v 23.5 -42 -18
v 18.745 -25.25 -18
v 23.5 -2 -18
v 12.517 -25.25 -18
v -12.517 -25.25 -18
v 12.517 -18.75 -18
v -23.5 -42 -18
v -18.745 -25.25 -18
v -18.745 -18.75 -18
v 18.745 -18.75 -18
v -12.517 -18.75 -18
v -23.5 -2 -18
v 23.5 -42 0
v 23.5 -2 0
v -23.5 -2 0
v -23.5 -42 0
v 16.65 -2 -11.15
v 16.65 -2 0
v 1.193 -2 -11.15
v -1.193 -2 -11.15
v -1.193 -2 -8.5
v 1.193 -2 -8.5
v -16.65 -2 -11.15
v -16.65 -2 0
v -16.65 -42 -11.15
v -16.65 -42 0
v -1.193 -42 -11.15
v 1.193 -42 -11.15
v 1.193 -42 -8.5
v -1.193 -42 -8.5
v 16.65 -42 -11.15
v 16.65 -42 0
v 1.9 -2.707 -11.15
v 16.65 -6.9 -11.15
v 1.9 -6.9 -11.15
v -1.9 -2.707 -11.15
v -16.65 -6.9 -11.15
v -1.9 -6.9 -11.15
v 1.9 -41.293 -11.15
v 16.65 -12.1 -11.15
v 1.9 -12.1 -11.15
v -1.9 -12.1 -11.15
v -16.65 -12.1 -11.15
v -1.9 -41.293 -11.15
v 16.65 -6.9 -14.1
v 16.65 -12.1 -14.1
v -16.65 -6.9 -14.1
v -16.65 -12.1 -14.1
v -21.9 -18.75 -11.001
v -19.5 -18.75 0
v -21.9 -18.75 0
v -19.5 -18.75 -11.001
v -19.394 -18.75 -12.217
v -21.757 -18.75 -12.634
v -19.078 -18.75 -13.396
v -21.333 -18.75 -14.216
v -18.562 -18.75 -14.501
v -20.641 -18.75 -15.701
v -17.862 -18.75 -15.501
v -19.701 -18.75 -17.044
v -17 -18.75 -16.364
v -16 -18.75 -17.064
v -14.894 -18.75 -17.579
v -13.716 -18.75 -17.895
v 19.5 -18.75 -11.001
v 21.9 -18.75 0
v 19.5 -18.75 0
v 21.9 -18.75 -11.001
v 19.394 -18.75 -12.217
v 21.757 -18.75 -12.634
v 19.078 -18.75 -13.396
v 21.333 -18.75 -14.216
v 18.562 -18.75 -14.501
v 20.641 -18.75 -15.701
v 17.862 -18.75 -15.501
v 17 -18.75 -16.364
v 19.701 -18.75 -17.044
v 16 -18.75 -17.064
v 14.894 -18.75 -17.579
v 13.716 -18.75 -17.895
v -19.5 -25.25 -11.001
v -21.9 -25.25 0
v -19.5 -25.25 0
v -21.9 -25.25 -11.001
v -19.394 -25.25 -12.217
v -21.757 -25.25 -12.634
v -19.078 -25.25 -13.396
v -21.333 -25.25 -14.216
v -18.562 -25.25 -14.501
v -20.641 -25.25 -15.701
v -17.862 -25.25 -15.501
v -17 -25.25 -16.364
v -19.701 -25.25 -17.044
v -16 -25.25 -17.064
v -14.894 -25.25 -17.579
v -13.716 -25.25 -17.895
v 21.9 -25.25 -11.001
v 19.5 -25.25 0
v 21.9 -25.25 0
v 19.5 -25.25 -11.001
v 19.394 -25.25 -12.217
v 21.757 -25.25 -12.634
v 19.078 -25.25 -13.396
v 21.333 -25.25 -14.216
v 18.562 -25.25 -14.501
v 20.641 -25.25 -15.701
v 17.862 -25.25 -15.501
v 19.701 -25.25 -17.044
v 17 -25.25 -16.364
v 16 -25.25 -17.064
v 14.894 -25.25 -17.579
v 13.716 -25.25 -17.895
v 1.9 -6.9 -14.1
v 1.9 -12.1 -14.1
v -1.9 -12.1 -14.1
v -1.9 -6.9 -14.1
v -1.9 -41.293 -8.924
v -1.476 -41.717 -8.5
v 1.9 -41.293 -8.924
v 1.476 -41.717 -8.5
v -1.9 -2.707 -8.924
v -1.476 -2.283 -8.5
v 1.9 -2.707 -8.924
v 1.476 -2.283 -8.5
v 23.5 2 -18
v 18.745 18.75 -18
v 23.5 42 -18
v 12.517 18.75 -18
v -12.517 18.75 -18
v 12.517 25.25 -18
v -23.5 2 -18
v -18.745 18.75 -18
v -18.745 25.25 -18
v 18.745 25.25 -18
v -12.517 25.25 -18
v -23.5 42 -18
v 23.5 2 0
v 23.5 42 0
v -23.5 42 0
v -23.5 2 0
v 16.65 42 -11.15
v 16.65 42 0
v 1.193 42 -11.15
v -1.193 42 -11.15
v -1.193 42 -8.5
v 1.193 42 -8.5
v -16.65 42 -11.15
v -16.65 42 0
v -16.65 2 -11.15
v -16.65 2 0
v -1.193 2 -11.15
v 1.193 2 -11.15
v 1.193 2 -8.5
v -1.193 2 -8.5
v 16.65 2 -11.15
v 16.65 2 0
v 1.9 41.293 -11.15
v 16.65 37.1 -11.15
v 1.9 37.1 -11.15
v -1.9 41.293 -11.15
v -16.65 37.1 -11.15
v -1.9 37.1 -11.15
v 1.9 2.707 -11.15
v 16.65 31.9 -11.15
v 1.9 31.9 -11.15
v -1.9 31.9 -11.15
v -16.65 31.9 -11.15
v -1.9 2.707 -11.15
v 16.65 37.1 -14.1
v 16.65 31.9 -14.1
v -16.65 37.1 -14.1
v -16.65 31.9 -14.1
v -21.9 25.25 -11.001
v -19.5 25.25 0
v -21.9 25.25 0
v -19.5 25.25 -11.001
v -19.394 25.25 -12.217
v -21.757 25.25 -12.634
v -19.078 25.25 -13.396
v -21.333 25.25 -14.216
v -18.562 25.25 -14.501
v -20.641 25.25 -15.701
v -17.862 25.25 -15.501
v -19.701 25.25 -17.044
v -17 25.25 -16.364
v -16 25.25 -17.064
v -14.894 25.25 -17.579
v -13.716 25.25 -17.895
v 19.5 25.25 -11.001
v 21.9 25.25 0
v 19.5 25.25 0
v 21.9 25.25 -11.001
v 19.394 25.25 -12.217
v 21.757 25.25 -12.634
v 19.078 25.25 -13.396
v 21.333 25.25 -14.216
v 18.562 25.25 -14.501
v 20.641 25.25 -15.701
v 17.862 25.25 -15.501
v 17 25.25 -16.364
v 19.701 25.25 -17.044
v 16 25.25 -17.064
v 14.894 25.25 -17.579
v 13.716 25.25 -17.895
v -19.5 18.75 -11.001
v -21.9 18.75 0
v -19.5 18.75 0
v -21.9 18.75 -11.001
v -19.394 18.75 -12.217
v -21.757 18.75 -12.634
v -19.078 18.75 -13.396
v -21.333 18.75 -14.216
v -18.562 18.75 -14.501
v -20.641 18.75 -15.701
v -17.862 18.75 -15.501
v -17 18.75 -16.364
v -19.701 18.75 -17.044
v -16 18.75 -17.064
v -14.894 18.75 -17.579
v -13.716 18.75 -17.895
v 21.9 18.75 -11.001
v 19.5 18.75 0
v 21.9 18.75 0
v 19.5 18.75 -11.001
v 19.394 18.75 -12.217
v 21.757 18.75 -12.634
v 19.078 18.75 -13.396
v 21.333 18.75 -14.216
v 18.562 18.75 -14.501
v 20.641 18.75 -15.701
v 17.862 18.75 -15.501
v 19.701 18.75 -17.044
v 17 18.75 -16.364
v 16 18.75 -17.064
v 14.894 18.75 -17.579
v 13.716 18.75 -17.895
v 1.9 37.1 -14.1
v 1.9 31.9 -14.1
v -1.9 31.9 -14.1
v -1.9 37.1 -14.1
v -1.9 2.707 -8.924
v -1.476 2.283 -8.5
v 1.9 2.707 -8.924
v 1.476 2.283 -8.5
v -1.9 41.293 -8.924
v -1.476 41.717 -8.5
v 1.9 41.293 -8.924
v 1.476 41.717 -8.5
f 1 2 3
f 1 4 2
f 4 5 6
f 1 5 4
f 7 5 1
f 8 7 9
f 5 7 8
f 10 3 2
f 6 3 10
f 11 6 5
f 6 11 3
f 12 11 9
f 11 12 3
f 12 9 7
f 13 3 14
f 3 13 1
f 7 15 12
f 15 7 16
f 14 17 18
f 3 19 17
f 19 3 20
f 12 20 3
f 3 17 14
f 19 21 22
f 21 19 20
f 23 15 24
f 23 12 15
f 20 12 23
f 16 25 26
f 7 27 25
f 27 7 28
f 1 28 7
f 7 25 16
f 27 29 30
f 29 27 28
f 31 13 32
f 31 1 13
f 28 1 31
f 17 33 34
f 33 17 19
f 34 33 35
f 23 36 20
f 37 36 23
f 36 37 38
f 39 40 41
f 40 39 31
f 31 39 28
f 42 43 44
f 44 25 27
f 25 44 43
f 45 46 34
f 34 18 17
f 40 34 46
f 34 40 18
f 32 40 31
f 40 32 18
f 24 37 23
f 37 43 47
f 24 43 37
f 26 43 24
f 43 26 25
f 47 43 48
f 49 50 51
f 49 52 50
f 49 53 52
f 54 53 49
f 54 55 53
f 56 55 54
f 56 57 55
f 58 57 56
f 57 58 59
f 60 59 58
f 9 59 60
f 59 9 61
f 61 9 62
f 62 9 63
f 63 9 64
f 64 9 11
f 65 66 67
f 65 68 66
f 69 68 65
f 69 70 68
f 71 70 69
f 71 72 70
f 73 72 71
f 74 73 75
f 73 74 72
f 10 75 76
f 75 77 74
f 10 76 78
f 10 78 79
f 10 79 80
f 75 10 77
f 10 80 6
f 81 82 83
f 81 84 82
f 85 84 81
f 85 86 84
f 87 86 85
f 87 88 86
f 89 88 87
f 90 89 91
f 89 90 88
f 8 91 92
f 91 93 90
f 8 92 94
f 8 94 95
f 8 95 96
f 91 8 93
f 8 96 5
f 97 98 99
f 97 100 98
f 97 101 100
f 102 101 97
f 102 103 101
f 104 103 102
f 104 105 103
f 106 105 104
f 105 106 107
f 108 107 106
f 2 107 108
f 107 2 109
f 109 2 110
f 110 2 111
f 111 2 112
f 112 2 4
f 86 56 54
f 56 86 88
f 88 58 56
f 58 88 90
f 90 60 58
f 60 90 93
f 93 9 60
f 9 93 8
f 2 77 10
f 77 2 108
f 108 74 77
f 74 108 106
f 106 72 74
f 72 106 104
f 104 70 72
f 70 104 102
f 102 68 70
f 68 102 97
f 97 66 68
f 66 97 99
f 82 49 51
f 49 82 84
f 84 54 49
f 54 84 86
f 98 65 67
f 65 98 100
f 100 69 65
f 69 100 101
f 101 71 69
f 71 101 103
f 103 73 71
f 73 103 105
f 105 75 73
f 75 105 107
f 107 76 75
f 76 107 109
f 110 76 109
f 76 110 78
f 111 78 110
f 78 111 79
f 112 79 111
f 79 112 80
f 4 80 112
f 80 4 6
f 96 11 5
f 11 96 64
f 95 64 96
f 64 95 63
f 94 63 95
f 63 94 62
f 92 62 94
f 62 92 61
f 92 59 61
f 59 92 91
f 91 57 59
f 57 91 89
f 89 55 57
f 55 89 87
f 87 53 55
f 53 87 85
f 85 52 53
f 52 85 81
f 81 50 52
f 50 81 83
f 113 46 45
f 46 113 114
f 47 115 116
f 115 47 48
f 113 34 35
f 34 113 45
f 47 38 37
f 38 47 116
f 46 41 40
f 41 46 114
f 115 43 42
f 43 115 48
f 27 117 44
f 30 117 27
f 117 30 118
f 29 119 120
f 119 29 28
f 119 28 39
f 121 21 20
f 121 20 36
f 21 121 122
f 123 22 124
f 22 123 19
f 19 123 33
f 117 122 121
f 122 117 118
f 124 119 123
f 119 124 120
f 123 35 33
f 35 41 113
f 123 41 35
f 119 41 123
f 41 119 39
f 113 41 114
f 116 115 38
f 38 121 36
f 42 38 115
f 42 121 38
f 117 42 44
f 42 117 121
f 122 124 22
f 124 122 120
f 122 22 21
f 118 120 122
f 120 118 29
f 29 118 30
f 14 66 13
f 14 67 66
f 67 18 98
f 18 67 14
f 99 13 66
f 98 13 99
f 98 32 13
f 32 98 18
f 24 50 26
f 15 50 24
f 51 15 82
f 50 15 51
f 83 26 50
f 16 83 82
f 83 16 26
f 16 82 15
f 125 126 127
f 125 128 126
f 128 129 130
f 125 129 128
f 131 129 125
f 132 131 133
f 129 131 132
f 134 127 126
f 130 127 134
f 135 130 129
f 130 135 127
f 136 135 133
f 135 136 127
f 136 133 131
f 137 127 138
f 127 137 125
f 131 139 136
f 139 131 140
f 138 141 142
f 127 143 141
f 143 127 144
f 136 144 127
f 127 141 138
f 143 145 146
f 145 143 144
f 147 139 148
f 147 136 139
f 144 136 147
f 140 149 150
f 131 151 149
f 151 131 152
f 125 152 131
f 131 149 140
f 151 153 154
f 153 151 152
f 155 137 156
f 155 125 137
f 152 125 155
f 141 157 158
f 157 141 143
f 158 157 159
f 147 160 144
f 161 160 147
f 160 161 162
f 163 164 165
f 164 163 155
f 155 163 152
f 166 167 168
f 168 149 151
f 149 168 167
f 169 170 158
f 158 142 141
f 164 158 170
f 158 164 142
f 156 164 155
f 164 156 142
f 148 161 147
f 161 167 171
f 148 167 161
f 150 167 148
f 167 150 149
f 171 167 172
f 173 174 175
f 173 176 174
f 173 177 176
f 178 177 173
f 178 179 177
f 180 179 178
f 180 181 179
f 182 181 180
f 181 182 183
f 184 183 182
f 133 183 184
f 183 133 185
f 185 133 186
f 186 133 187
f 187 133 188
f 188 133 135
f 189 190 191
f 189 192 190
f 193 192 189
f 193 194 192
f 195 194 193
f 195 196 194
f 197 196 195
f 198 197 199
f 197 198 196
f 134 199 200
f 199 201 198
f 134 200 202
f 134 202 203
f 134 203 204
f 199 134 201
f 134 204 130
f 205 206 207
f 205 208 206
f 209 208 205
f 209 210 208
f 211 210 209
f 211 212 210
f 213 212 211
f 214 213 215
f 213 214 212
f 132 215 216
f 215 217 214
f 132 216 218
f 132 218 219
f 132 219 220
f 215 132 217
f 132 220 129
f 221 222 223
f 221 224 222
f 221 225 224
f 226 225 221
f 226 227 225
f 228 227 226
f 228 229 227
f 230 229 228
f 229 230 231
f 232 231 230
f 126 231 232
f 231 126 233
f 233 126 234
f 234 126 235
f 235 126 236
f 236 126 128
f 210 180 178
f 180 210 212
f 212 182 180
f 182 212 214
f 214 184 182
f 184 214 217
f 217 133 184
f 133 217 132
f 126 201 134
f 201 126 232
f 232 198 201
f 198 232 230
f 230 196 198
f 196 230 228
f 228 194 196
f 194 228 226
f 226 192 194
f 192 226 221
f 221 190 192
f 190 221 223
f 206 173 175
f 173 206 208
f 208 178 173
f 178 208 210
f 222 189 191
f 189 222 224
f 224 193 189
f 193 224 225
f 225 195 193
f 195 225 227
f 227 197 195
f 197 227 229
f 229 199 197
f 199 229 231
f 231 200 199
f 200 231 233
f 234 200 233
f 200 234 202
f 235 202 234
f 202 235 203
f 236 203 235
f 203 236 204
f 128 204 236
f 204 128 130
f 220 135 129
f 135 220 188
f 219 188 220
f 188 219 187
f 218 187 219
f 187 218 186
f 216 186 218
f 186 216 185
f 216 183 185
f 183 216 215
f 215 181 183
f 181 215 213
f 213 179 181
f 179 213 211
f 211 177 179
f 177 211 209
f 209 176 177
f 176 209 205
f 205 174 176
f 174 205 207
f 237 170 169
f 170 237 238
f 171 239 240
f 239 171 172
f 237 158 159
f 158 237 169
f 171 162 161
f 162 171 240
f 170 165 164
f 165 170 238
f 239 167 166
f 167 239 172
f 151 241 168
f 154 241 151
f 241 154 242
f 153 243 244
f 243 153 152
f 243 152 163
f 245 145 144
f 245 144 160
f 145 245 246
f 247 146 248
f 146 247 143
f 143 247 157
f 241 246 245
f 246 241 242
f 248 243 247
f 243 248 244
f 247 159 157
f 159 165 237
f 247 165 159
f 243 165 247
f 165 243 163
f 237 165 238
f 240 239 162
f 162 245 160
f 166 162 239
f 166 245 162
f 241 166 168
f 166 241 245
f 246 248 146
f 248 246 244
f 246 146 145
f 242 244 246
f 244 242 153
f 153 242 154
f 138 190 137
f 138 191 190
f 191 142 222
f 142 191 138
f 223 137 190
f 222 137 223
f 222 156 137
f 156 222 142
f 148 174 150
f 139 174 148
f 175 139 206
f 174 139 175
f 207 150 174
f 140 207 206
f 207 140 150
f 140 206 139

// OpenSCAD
// file: common.scad
$fa = 10;
$fs = 0.2;
eps = 0.003;
$zstep = 0.2;

// An inward chamfer sufficient to prevent elephant's foot.
foot = 0.4;

// FINDINGS FROM CLEARANCE TEST
//
// Consider a vertical hole of width X, a layer height of 0.2, and a vertical
// post.
//   * A post of diameter X will not fit in.
//   * A post of diameter X-0.1 will fit in, but is very hard to slide in or out.
//     This is probably due mostly to the transverse grain of the print.
//     It will rotate, but with some resistance.
//   * A post of diameter X-0.2 slides in and out easily. It rotates easily, but
//     still has noticeable resistance at some points.
//   * A post of diameter X-0.3 rotates freely. It also has noticeable play
//     from side to side.
//
// Clearances are expressed as the total across both sides of a joint.
tight = 0.1;  // Intended for stationary joints.
snug = 0.2;   // Moves, but with some resistance.
loose = 0.3;  // Free movement.
extra_loose = 0.4;

// A brim is a 0.2mm layer printed near an edge which is likely to warp.
// The edge should be chamfered outwards at 45 degrees. The brim should
// be placed this far from the bottom of the edge, so it barely touches
// the chamfer.
brim_offset = 0.3;

// Menards 5/8 x 2-3/4 x 0.04 WG compression spring.
spring_od = 5/8 * 25.4;
// Subtract 10 from the relaxed length so everything is slightly tensioned
// all the time.
spring_max_length = 2.75 * 25.4 - 10;
spring_min_length = 16;  // Approximate.

// Menards 1/4 inch aluminum rod.
roller_diameter = 6.7;
roller_cavity_diameter = roller_diameter + loose;

// 550 paracord. Make this wide enough to accommodate a melted end.
string_diameter = 4.5;

// Standard spring tube.
tube_id = spring_od + 0.7;

module octagon(diameter) {
  intersection_for(a = [0, 45])
    rotate([0, 0, a])
      square(diameter, center=true);
}

// A cylinder with a chamfered or flared bottom end, useful for dealing
// with elephant's foot on pins or holes.
module flare_cylinder(height, radius, flare) {
  translate([0, 0, abs(flare)-eps])
    cylinder(height-abs(flare)+eps, radius, radius);

  linear_extrude(abs(flare), scale=radius/(radius-flare))
    circle(radius-flare);
}

// A cube with a chamfered or flared bottom end, useful for dealing
// with elephant's foot on pins or holes.
module flare_cube(dims, flare) {
  translate([0, 0, abs(flare)-eps])
    cube([dims.x, dims.y, dims.z - abs(flare) + eps]);

  translate([dims.x/2, dims.y/2, 0])
    linear_extrude(abs(flare), scale=[dims.x/(dims.x-2*flare), dims.y/(dims.y-2*flare)])
      translate([-(dims.x-2*flare)/2, -(dims.y-2*flare)/2, abs(flare)-eps])
        square([dims.x-2*flare, dims.y-2*flare]);
}

// An approximate circle which can be printed on its side.
module circle_ish(r) {
  // Safe overhang angle.
  q = 45;
  
  intersection() {
    // Add 0.2 (one print layer) in case the bridge is messy and hangs
    // down.
    square(2*r+0.2, center=true);
    hull() {
      circle(r);
      for (a = [-1, 1])
        translate([0, a*r/cos(q), 0])
          square(eps, center=true);
    }
  }
}

// Depth of the sockets used as glue aids.
socket_depth = 5;

module socket() {
  translate([-1.5, -1.5, -eps])
    flare_cube([3, 3, socket_depth], -foot);
}

module lug() {
  flare_cube([3-snug, 3-snug, 2*socket_depth-2], foot);
}

// Nerf darts are 0.50 cal.
dart_diameter = 12.7;
dart_length = 72;

module octahedron(major_radius=1) {
  // Top and bottom halves.
  for (a = [-1, 1])
    scale([1, 1, a])
      // Extrude a square into a pyramid.
      linear_extrude(major_radius, scale=0)
        rotate([0, 0, 45])
          square(sqrt(2)*major_radius, center=true);
}

module chamfered_cube(dims, chamfer=1) {
  assert(dims.x >= 2*chamfer);
  assert(dims.y >= 2*chamfer);
  assert(dims.z >= 2*chamfer);

  hull()
    for (a = [0, 1], b = [0, 1], c = [0, 1])
        translate([
          (dims.x - 2*chamfer) * a + chamfer,
          (dims.y - 2*chamfer) * b + chamfer,
          (dims.z - 2*chamfer) * c + chamfer
        ])
          octahedron(chamfer);
}
// file: barrel2.scad
include <common.scad>

// 120 is about the limit of the cams.
stroke = 110;
trigger_width = 8;
trigger_cavity_width = 8.5;
trigger_cavity_length = 20;

barrel_length = 220;

// Tall enough for the string.
barrel_gap = 4;

// Should be wide enough to accommodate whatever bore structure we
// want.
barrel_width = 22;
barrel_height = 33;

slider_wall = 7;
slider_width = barrel_width + 2*slider_wall;
slider_height = barrel_height + 2*slider_wall;

barrel_lug_x = 3;
barrel_lug_y = 5;

// Tested with several darts.
main_bore = 13.8;

zip_channel_height = 2.4;
zip_channel_width = 6.5;

module barrel(trigger_slot=false) {
  // Make the bore with high precision.
  $fa = 5;
  
  difference() {
    union() {
      // Main length.
      translate([-barrel_width/2, 0, 0])
        cube([barrel_width, barrel_length, barrel_height/2 - barrel_gap/2]);
      
      // Lugs on one end for attaching to a fixed piece.
      translate([-barrel_width/2 - barrel_lug_x, 0, 0])
        cube([barrel_width + barrel_lug_x*2, barrel_lug_y, barrel_height/2 - barrel_gap/2]);
    }
    
    // Bore.
    translate([0, -eps, barrel_height/2])
      rotate([-90, 0, 0])
        cylinder(barrel_length+2*eps, d=main_bore);
            
    // Outside foot chamfers.
    for (x = barrel_width/2 * [-1, 1])
      translate([x, 0, 0])
        rotate([0, 45, 0])
          cube([sqrt(0.32), barrel_length*2+eps, sqrt(0.32)], center=true);
    
    if (trigger_slot) {
      // Trigger slot.
      translate([-trigger_cavity_width/2, -eps, -eps])
        cube([trigger_cavity_width, trigger_cavity_length, barrel_height]);  

      // Inside foot chamfers.
      for (x = trigger_cavity_width/2 * [-1, 1])
        translate([x, trigger_cavity_length/2, 0])
          rotate([0, 45, 0])
            cube([sqrt(0.32), trigger_cavity_length, sqrt(0.32)], center=true);
    }
  }
    
  // Brims to prevent warping.
  brim_lip_x = 7;
  brim_lip_y = 5;
  difference() {
    translate([-barrel_width/2-brim_lip_x, -brim_lip_y, 0])
      cube([barrel_width + 2*brim_lip_x, barrel_length + 2*brim_lip_y, 0.4]);
    translate([-barrel_width/2-brim_lip_x - 0.5, brim_lip_y, -eps])
      cube([barrel_width + 2*brim_lip_x + 1, barrel_length - 2*brim_lip_y, 1]);
  }
}

module slider(length) {
  difference() {
    cube([slider_width, length, slider_height], center=true);
    cube([barrel_width + loose, length + 1, barrel_height + loose], center=true);

    // Zip tie channel.
    translate([0, zip_channel_width/2, 0]) {
      rotate([90, 0, 0]) {
        linear_extrude(zip_channel_width) {
          difference() {
            offset(slider_wall + zip_channel_height)
              square([barrel_width + eps, barrel_height - slider_wall - 1], center=true);
            offset(slider_wall)
              square([barrel_width + eps, barrel_height - slider_wall - 1], center=true);
          }
        }
      }
    }
    
    // Slot for lug on the end of the barrel.
    translate([0, length/2 - barrel_lug_y*1.5, 0]) {
      cube([
        barrel_width + 2*barrel_lug_x + snug,
        barrel_lug_y + snug,
        barrel_height + loose
      ], center=true);
    }
  }
  

  // Lugs which slide between two barrel halves.
  lug_height = barrel_gap - snug;
  lug_intrusion = 2.5;
  difference() {
    cube([slider_width, length, lug_height], center=true);
    cube([barrel_width - 2*lug_intrusion, length + 1, lug_height + 1], center=true);
    
    // End chamfers.
    for (y = length/2 * [-1, 1], z = lug_height/2 * [-1, 1])
      translate([0, y, z])
        rotate([45, 0, 0])
          cube([slider_width, 1, 1], center=true);
    
    // Length chamfers.
    for (x = (barrel_width - 2*lug_intrusion)/2 * [-1, 1], z = lug_height/2 * [-1, 1])
      translate([x, 0, z])
        rotate([0, 45, 0])
          cube([0.6, length, 0.6], center=true);
  }
}

module slider_print() {
  for (y = [-22, 22]) {
    translate([0, y, 0]) {
      rotate([0, 90, 0]) {
        intersection() {
          slider(40);
          translate([0, -100, -100])
            cube(200);
        }
      }
    }
  }
}  

slider_print();
// main file
include <barrel2.scad>
include <common.scad>

pin_diameter = 3.175;
pin_hole_diameter = pin_diameter + loose;

main_diameter = 13;
link_thickness = 12;
link_height = 14;

module front_link_2d(length) {
  difference() {
    union() {
      hull() {
        circle(d=main_diameter);
        translate([0, length])
          circle(d=main_diameter);
      }
      hull() {
        circle(d=main_diameter);
        translate([link_height, 0])
          octagon(main_diameter);
      }
    }
    
    for (xy = [[link_height, 0], [0, length]])
      translate(xy)
        octagon(pin_hole_diameter);
  }
}

module front_link(length) {
  rotate([0, -90, 0])
    linear_extrude(link_thickness)
      front_link_2d(length);
}

module rear_link_a_2d(length) {
  difference() {
    union() {
      hull() {
        translate([0, main_diameter])
          octagon(main_diameter);
        translate([0, length])
          circle(d=main_diameter);
      }

    }
    translate([0, length])
      octagon(pin_hole_diameter);
  }
}

module rear_link_b_2d() {
  difference() {
    hull() {
      octagon(main_diameter);    
      translate([link_height, 0])
        octagon(main_diameter);    
      translate([0, main_diameter*2])
        octagon(main_diameter);    
    }
    translate([link_height, 0])
      octagon(pin_hole_diameter);
  }
}

module rear_link(length) {  
  rotate([0, -90, 0]) {
    linear_extrude(link_thickness)
      rear_link_a_2d(length);
    
    for (z = [-link_thickness/2, link_thickness + loose/2])
      translate([0, 0, z])
        linear_extrude(link_thickness/2 - loose/2)
          rear_link_b_2d();
    
    for (z = [-loose/2, link_thickness]) {
      translate([0, 0, z]) {
        linear_extrude(loose/2) {
          intersection() {
            rear_link_a_2d(length);
            rear_link_b_2d();
          }
        }
      }
    }
  }
}

module link_pair(stroke) {
  // Avoid over-angling.
  min_separation = 4 * main_diameter;
  max_separation = min_separation + stroke;
  link_length = max_separation / 2;

  translate([link_thickness, 0, 0])  
    rear_link(link_length);
  translate([-link_thickness, 0, 0])  
    front_link(link_length);
}

module link_anchor_2d(hole = true, spread) {
  difference() {
    hull() {
      translate([link_height - slider_wall, 0])
        circle(d=main_diameter);
      translate([-main_diameter/2, -main_diameter/2])
        square([eps, main_diameter * (1 + spread)]);
    }
    if (hole)
      translate([link_height - slider_wall, 0])
        octagon(pin_hole_diameter);
  }
}

link_anchor_play = 1.5;
link_anchor_thickness = link_thickness + link_anchor_play;

module link_anchor(wall = 0, spread = 1) {
  translate([main_diameter/2, 0, 0]) {
    difference() {
      linear_extrude(link_anchor_thickness)
        link_anchor_2d(spread=spread);
      translate([main_diameter/2 - slider_wall, -15, link_thickness/2 + loose/2 + link_anchor_play])
        cube([30, 30, link_thickness - loose]);
    }
    
    if (wall > 0)
      // Put plates on both ends of the pin.
      translate([0, 0, -wall])
        linear_extrude(wall)
          link_anchor_2d(hole=false, spread=spread);
  }
}
